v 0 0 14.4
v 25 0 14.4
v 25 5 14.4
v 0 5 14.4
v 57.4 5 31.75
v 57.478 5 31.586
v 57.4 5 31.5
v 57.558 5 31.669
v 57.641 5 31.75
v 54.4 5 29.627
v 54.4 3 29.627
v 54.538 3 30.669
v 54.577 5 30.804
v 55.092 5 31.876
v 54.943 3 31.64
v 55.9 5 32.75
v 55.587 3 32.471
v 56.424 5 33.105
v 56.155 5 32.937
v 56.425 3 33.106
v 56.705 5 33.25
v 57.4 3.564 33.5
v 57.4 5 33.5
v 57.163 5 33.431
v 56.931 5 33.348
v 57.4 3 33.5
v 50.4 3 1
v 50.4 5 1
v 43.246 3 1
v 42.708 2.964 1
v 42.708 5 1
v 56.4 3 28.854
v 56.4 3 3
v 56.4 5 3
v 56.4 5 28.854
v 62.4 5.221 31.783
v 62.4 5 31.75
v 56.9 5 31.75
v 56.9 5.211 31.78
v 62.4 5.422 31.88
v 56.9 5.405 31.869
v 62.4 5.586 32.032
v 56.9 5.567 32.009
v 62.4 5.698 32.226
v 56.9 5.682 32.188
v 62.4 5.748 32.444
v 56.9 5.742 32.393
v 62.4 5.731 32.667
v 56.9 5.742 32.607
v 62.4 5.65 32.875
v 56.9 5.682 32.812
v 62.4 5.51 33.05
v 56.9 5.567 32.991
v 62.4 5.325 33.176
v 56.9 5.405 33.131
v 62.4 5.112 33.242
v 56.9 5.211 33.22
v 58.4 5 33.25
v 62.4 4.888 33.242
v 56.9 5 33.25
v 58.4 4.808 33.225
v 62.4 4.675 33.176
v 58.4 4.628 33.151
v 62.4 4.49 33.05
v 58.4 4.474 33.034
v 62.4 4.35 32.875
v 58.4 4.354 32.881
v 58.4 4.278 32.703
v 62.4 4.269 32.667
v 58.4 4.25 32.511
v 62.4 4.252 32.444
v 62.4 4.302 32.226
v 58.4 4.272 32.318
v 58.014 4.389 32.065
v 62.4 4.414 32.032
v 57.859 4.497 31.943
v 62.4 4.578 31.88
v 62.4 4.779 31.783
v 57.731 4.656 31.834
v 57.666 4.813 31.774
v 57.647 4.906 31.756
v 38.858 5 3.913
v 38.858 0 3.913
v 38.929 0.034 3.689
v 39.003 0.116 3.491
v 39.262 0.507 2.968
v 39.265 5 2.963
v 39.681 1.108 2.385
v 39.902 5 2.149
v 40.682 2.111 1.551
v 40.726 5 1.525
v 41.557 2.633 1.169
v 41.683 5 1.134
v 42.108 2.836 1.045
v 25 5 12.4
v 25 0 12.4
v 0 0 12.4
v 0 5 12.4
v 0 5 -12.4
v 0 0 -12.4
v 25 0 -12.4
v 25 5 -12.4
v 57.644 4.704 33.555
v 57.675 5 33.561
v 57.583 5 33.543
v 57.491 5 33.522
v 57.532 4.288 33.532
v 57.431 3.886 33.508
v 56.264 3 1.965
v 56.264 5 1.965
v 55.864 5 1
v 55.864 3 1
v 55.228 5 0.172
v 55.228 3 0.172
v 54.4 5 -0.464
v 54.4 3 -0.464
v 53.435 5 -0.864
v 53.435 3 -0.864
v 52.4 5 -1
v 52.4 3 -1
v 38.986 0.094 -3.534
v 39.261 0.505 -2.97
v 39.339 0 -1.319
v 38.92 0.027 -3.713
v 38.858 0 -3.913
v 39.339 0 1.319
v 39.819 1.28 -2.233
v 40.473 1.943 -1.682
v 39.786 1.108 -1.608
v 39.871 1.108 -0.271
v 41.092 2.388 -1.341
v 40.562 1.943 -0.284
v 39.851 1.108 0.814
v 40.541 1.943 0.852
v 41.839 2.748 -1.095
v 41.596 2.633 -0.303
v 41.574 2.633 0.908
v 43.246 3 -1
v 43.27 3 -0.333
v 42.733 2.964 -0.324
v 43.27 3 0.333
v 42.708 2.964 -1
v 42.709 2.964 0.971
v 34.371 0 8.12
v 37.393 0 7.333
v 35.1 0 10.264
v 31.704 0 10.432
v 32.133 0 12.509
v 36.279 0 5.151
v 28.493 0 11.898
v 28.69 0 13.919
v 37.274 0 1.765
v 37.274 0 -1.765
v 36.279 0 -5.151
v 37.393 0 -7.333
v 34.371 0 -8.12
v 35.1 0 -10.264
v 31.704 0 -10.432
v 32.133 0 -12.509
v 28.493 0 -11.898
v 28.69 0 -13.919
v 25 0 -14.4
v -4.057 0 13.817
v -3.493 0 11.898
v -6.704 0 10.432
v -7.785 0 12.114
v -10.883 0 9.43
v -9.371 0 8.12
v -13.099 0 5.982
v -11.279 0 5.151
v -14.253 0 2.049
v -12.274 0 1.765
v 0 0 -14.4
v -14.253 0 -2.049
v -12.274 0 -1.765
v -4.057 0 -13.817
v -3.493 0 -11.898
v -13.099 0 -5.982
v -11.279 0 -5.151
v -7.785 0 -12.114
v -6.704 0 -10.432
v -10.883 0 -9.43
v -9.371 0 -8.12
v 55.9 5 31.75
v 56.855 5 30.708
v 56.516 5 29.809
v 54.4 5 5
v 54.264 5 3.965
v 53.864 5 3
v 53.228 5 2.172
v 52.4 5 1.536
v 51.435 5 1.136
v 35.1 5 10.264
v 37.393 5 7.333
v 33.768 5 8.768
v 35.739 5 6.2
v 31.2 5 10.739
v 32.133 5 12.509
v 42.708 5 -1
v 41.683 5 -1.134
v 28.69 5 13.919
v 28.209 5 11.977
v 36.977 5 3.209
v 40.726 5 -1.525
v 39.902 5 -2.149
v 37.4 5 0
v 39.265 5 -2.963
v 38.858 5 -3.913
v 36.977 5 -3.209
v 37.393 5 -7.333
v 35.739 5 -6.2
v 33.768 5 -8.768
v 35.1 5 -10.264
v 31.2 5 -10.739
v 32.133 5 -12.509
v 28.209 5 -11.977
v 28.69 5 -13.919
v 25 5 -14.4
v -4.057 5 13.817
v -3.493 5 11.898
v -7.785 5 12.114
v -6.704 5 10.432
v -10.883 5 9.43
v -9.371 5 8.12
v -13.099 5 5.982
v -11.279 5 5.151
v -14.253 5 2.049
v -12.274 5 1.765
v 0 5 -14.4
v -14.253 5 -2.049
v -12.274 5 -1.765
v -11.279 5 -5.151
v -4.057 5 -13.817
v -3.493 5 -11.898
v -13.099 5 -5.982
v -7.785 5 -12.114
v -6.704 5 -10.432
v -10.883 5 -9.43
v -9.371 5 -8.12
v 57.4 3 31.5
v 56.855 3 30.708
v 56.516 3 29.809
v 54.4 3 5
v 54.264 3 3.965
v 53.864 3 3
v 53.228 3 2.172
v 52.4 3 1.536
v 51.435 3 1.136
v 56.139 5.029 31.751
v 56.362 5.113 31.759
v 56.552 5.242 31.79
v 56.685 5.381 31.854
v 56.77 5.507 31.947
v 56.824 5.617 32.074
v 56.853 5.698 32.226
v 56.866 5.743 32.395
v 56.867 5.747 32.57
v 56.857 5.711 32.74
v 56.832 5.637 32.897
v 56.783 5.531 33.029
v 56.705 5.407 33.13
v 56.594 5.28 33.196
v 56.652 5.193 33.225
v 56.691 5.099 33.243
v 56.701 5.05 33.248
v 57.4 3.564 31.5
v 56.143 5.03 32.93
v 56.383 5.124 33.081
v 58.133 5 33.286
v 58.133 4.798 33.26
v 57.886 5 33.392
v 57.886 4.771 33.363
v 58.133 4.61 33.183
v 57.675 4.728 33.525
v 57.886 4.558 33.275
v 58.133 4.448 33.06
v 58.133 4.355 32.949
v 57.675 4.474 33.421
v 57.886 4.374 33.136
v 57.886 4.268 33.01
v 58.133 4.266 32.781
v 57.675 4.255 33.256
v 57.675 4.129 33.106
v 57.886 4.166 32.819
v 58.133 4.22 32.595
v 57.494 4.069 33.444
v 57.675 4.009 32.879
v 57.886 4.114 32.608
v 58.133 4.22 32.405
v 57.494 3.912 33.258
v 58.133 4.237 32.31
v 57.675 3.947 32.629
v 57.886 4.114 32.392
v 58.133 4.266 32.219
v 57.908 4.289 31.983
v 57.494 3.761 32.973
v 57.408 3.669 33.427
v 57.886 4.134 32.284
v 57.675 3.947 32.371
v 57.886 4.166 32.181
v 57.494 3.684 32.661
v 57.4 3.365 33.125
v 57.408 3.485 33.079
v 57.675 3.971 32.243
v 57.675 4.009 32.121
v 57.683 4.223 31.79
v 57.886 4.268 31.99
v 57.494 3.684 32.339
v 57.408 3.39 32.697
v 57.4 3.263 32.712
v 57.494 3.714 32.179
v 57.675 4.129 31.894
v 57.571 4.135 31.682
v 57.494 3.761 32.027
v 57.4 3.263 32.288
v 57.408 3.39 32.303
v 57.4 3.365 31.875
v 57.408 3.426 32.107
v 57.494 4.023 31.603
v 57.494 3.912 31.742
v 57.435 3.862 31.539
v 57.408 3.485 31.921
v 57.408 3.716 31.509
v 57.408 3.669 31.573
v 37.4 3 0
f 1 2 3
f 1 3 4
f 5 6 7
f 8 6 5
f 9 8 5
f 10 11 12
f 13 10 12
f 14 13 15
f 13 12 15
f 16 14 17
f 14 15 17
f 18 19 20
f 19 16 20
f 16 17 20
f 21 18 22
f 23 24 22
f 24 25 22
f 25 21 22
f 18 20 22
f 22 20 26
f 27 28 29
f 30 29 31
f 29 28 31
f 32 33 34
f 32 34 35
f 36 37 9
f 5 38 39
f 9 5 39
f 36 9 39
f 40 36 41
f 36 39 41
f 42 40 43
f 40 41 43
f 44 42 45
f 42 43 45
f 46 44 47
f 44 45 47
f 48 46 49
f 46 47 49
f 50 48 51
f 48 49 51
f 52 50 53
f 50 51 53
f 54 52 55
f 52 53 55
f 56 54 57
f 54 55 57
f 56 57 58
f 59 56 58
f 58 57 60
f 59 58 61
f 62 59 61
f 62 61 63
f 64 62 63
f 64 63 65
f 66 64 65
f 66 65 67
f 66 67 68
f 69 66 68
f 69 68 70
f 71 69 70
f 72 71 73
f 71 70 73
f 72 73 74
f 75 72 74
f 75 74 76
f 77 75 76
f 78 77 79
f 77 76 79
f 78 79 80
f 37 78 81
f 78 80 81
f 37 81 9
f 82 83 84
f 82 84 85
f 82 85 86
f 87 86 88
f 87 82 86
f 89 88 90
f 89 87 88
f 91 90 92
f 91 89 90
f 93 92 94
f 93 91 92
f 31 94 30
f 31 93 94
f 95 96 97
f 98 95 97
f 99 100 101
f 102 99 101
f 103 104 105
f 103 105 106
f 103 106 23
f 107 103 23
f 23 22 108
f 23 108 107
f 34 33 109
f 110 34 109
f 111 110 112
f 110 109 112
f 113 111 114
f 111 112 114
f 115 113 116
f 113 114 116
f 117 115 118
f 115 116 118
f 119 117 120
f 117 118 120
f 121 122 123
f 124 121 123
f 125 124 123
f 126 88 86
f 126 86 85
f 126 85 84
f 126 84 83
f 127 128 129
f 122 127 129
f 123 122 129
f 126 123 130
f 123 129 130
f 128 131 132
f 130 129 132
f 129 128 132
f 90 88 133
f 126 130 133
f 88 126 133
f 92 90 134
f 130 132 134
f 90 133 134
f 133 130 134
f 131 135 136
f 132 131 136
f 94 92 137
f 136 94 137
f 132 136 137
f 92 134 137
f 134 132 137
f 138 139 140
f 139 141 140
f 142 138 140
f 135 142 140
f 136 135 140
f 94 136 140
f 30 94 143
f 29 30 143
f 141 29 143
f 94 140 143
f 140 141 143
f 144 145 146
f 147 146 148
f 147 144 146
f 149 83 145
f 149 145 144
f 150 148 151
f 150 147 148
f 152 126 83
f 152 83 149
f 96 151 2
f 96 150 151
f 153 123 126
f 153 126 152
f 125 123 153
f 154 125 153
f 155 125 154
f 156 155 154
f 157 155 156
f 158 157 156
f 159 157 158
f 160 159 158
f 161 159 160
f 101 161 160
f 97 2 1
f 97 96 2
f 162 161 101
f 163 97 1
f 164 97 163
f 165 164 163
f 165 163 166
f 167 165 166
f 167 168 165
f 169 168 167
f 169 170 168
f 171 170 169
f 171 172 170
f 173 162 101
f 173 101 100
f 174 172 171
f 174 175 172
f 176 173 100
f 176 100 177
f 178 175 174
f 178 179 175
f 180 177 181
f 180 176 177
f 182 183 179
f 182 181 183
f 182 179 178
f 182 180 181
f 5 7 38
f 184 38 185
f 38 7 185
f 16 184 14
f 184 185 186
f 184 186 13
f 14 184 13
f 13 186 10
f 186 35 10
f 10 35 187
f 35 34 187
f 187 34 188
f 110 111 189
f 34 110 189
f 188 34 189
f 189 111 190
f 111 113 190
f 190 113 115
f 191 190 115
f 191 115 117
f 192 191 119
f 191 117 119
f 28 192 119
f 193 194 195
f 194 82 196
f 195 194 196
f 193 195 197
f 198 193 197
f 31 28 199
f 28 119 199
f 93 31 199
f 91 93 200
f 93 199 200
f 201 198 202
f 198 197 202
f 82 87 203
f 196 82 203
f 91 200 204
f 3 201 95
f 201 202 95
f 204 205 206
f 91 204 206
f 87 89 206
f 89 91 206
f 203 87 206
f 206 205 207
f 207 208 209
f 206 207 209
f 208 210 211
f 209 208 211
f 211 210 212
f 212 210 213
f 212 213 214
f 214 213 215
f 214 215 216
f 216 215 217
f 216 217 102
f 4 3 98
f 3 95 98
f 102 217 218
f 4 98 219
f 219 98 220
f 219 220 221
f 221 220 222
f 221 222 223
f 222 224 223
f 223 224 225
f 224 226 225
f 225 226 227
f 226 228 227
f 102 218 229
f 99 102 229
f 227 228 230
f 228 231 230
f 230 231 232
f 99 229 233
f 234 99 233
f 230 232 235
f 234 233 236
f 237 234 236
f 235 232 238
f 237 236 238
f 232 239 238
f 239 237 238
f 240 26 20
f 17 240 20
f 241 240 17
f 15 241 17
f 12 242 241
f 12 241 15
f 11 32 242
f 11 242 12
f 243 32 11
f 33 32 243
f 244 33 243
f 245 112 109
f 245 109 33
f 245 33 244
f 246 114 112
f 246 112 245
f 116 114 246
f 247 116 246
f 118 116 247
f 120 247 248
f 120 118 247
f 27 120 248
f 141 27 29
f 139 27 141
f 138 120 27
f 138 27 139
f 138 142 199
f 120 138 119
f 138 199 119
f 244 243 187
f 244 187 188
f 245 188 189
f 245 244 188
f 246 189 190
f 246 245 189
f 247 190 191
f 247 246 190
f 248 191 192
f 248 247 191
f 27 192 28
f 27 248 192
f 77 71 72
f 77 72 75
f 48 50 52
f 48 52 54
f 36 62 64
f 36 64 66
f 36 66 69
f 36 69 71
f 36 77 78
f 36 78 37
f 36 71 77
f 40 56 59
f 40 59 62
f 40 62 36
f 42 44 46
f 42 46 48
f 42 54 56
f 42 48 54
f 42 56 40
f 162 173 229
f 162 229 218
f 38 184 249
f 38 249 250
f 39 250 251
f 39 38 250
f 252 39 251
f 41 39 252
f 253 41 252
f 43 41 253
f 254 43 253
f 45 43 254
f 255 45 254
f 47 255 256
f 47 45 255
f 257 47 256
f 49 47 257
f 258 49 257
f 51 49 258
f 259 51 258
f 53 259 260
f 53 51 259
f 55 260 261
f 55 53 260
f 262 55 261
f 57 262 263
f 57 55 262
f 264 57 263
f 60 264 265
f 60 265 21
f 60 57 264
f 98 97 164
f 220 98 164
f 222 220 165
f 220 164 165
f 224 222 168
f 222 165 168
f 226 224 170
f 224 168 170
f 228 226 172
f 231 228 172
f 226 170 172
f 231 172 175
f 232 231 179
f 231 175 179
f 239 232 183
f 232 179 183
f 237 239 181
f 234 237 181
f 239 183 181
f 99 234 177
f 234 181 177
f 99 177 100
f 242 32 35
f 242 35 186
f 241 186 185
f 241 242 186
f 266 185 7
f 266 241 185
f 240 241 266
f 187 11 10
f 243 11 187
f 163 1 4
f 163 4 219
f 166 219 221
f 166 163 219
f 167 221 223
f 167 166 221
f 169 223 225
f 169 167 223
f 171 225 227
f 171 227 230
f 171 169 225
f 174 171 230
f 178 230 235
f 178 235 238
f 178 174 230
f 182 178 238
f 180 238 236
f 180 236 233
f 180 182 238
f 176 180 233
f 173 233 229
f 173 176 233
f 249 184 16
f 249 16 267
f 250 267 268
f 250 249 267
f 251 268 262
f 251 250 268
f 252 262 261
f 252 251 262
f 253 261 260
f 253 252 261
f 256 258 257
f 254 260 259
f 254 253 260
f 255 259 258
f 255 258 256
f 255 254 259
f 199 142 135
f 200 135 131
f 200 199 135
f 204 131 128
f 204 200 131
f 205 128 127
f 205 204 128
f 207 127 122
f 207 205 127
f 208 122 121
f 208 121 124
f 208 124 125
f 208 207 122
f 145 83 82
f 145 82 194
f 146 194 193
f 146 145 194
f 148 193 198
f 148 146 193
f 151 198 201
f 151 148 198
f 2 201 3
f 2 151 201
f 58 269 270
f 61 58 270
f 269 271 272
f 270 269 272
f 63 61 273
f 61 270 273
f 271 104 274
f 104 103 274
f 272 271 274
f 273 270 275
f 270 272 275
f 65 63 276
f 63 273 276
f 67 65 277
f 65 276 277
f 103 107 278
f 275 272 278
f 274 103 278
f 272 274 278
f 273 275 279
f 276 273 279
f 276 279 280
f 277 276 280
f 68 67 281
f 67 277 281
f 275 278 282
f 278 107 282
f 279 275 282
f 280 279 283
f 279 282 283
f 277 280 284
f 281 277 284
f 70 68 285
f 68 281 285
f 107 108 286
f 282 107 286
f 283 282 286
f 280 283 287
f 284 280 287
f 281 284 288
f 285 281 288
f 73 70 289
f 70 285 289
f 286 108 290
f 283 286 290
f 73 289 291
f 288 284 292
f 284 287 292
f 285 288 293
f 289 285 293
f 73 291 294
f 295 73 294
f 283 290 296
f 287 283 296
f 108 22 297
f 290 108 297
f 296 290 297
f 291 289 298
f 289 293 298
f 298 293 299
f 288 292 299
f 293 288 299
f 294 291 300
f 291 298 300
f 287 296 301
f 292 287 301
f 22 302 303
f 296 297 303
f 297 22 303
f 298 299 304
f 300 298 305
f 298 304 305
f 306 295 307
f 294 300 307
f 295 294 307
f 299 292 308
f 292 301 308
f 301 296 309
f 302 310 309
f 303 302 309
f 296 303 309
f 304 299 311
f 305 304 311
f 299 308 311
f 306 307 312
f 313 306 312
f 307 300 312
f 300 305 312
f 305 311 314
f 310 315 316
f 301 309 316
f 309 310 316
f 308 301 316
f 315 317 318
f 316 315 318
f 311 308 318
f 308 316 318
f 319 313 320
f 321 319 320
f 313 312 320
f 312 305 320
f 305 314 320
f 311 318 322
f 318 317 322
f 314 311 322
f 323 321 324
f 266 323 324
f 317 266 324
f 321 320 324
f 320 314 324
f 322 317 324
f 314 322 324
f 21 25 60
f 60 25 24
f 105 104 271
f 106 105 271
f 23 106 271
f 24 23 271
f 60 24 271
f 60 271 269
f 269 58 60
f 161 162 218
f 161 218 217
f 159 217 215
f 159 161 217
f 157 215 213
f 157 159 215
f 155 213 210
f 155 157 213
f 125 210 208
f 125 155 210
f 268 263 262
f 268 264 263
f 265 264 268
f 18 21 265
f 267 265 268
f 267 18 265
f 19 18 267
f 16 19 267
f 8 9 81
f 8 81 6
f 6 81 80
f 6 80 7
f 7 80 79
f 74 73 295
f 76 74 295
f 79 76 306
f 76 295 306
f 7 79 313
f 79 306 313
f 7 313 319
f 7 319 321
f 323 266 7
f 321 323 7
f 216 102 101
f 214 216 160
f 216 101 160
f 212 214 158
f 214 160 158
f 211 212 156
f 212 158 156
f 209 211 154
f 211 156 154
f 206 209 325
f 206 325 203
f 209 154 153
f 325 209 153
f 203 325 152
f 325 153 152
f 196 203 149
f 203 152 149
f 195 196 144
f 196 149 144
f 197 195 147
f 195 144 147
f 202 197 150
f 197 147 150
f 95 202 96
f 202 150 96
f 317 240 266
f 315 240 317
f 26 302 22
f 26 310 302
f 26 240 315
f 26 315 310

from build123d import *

# Parameters (mm, degrees)
BOSS_EXTRUDE1_DEPTH      = 5
BOSS_EXTRUDE2_START      = 2
SKETCH2_W                = 2
SKETCH2_H                = 2
SKETCH2_H_2              = 30.5
SKETCH2_W_2              = 1
BOSS_EXTRUDE2_DEPTH      = 2
FILLET1_R                = 4
BOSS_EXTRUDE3_DEPTH      = 5
BOSS_EXTRUDE3_DEPTH_BACK = 0.5
SKETCH3_R                = 0.75
FILLET2_R                = 1


with BuildPart() as part:
    # Sketch1 → Boss-Extrude1 (new body)
    with BuildSketch(Plane(origin=(0, 0, 0), x_dir=(1, 0, 0), z_dir=(0, 1, 0))):
        with BuildLine():
            Line((0, 14.4), (25, 14.4))
            ThreePointArc((25, 14.4), (39.4, 0), (25, -14.4))
            Line((25, -14.4), (0, -14.4))
            ThreePointArc((0, -14.4), (-14.4, 0), (0, 14.4))
        make_face()
        with BuildLine():
            Line((0, 12.4), (25, 12.4))
            ThreePointArc((25, 12.4), (37.4, 0), (25, -12.4))
            Line((25, -12.4), (0, -12.4))
            ThreePointArc((0, -12.4), (-12.4, 0), (0, 12.4))
        make_face(mode=Mode.SUBTRACT)
    extrude(amount=BOSS_EXTRUDE1_DEPTH)

    # Sketch2 → Boss-Extrude2 (add)
    with BuildSketch(Plane.XZ.offset(-5).offset(BOSS_EXTRUDE2_START)):
        with BuildLine():
            Line((39.365235814, -1), (54.4, -1))
            Line((54.4, -1), (54.4, 1))
            Line((54.4, 1), (39.365235814, 1))
            ThreePointArc((39.365235814, 1), (39.4, 0), (39.365235814, -1))
        make_face()
        with BuildLine():
            Line((37.4, -1), (39.365235814, -1))
            ThreePointArc((39.365235814, -1), (39.4, 0), (39.365235814, 1))
            Line((39.365235814, 1), (37.4, 1))
            Line((37.4, 1), (37.4, -1))
        make_face()
        with Locations((55.4, 0)):
            Rectangle(SKETCH2_W, SKETCH2_H)
        with Locations((55.4, 16.25)):
            Rectangle(SKETCH2_W, SKETCH2_H_2)
        with Locations((55.4, 32.5)):
            Rectangle(SKETCH2_W, SKETCH2_H)
        with Locations((56.9, 32.5)):
            Rectangle(SKETCH2_W_2, SKETCH2_H)
    extrude(amount=-BOSS_EXTRUDE2_DEPTH)

    # Fillet1
    # the kernel refuses this fillet: 4 mm, written as the material it adds along each edge
    with BuildSketch(Plane(origin=(25, 3, 0), x_dir=(0.7371891614816782, 0, -0.6756864214959037), z_dir=(-0.6756864214959037, 0, -0.7371891614816782))) as fillet1_piece_1_section:
        with BuildLine():
            CenterArc((18.272983346, 4), FILLET1_R, 194.477512186, 75.522487814)
            Line((18.272983346, 0), (18.272983346, -0.08))
            Line((18.272983346, -0.08), (14.4, -0.08))
            Line((14.4, -0.08), (14.32, 0))
            ThreePointArc((14.32, 0), (14.32, 1.5), (14.322540333, 2.98))
            Line((14.322540333, 2.98), (14.4, 3))
        make_face()
    fillet1_piece_1 = revolve(axis=Axis((25, 3, 0), (0, -1, 0)), revolution_arc=85.014954966, mode=Mode.PRIVATE)
    fillet1_piece_1 = split(fillet1_piece_1, bisect_by=Plane(origin=(40.301586348, 2.241602013, 1), z_dir=(0, 0, -1)), keep=Keep.TOP, mode=Mode.PRIVATE)
    fillet1_piece_1 = split(fillet1_piece_1, bisect_by=Plane(origin=(40.301586348, 2.241602013, -1), z_dir=(0, 0, 1)), keep=Keep.TOP, mode=Mode.PRIVATE)
    add(fillet1_piece_1)
    with BuildSketch(Plane(origin=(39.365235814, 5, 1), x_dir=(-0.17149804582148107, 0, 0.9851844600273663), z_dir=(0, -1, 0))) as fillet1_piece_2:
        with BuildLine():
            CenterArc((3.367524545, -3.978862537), FILLET1_R, 95.892851455, 74.232218513)
            Line((-0.573213295, -3.292870354), (-0.652028052, -3.27915051))
            Line((-0.652028052, -3.27915051), (-0.078814757, 0.013719844))
            Line((-0.078814757, 0.013719844), (0.008213474, 0.079577251))
            ThreePointArc((0.008213474, 0.079577251), (1.47842541, 0.003905135), (2.948637345, 0.079577251))
            Line((2.948637345, 0.079577251), (2.95685082, 0))
        make_face()
    extrude(amount=2)
    with BuildSketch(Plane(origin=(39.365235814, 5, -1), x_dir=(-0.17149804582148342, 0, -0.9851844600273658), z_dir=(0, -1, 0))) as fillet1_piece_3:
        with BuildLine():
            CenterArc((3.367524545, 3.978862537), FILLET1_R, 189.874930032, 74.232218513)
            Line((-0.573213295, 3.292870354), (-0.652028052, 3.27915051))
            Line((-0.652028052, 3.27915051), (-0.078814757, -0.013719844))
            Line((-0.078814757, -0.013719844), (0.008213474, -0.079577251))
            ThreePointArc((0.008213474, -0.079577251), (1.47842541, -0.003905135), (2.948637345, -0.079577251))
            Line((2.948637345, -0.079577251), (2.95685082, 0))
        make_face()
    extrude(amount=2)
    with BuildSketch(Plane(origin=(54.4, 3, 1), x_dir=(-1, 0, 0), z_dir=(0, 1, 0))) as fillet1_piece_4:
        with BuildLine():
            CenterArc((FILLET1_R, FILLET1_R), FILLET1_R, 180, 90)
            Line((0, FILLET1_R), (-FILLET1_R * 0.02, FILLET1_R))
            Line((-FILLET1_R * 0.02, FILLET1_R), (-FILLET1_R * 0.02, -FILLET1_R * 0.02))
            Line((-FILLET1_R * 0.02, -FILLET1_R * 0.02), (FILLET1_R, -FILLET1_R * 0.02))
            Line((FILLET1_R, -FILLET1_R * 0.02), (FILLET1_R, 0))
        make_face()
    extrude(amount=2)
    with BuildSketch(Plane(origin=(56.4, 3, 31.5), x_dir=(1, 0, 0), z_dir=(0, 1, 0))) as fillet1_piece_5:
        with BuildLine():
            CenterArc((4, 2.645751311), FILLET1_R, 180, 41.409622109)
            Line((0, 2.645751311), (-0.08, 2.645751311))
            Line((-0.08, 2.645751311), (-0.08, 0))
            Line((-0.08, 0), (0, -0.08))
            ThreePointArc((0, -0.08), (0.5, -0.08), (0.94, -0.052915026))
            Line((0.94, -0.052915026), (1, 0))
        make_face()
    extrude(amount=2)
    with BuildSketch(Plane(origin=(25, 3, 0), x_dir=(0.7371891614816782, 0, -0.6756864214959037), z_dir=(-0.6756864214959037, 0, -0.7371891614816782))) as fillet1_piece_6a_section:
        with BuildLine():
            CenterArc((18.272983346, 4), FILLET1_R, 194.477512186, 75.522487814)
            Line((18.272983346, 0), (18.272983346, -0.08))
            Line((18.272983346, -0.08), (14.4, -0.08))
            Line((14.4, -0.08), (14.32, 0))
            ThreePointArc((14.32, 0), (14.32, 1.5), (14.322540333, 2.98))
            Line((14.322540333, 2.98), (14.4, 3))
        make_face()
    fillet1_piece_6a = revolve(axis=Axis((25, 3, 0), (0, -1, 0)), revolution_arc=85.014954966, mode=Mode.PRIVATE)
    fillet1_piece_6a = split(fillet1_piece_6a, bisect_by=Plane(origin=(38.861424428, 2.266551756, -1), z_dir=(0, 0, -1)), keep=Keep.TOP, mode=Mode.PRIVATE)
    with BuildSketch(Plane(origin=(39.365235814, 5, -1), x_dir=(-0.17149804582148342, 0, -0.9851844600273658), z_dir=(0, -1, 0))) as fillet1_piece_6b_section:
        with BuildLine():
            CenterArc((3.367524545, 3.978862537), FILLET1_R, 189.874930032, 74.232218513)
            Line((-0.573213295, 3.292870354), (-0.652028052, 3.27915051))
            Line((-0.652028052, 3.27915051), (-0.078814757, -0.013719844))
            Line((-0.078814757, -0.013719844), (0.008213474, -0.079577251))
            ThreePointArc((0.008213474, -0.079577251), (1.47842541, -0.003905135), (2.948637345, -0.079577251))
            Line((2.948637345, -0.079577251), (2.95685082, 0))
        make_face()
    fillet1_piece_6b = extrude(amount=10.355974154, mode=Mode.PRIVATE)
    fillet1_piece_6b = split(fillet1_piece_6b, bisect_by=Plane(origin=(40.057221624, 0, -1.646357347), z_dir=(0, 1, 0)), keep=Keep.TOP, mode=Mode.PRIVATE)
    fillet1_piece_6b = split(fillet1_piece_6b, bisect_by=Plane(origin=(40.057221624, 3, -1.646357347), z_dir=(0, -1, 0)), keep=Keep.TOP, mode=Mode.PRIVATE)
    fillet1_piece_6 = fillet1_piece_6a & fillet1_piece_6b
    add(fillet1_piece_6)
    with BuildSketch(Plane(origin=(39.365235814, 5, 1), x_dir=(-0.17149804582148107, 0, 0.9851844600273663), z_dir=(0, -1, 0))) as fillet1_piece_7a_section:
        with BuildLine():
            CenterArc((3.367524545, -3.978862537), FILLET1_R, 95.892851455, 74.232218513)
            Line((-0.573213295, -3.292870354), (-0.652028052, -3.27915051))
            Line((-0.652028052, -3.27915051), (-0.078814757, 0.013719844))
            Line((-0.078814757, 0.013719844), (0.008213474, 0.079577251))
            ThreePointArc((0.008213474, 0.079577251), (1.47842541, 0.003905135), (2.948637345, 0.079577251))
            Line((2.948637345, 0.079577251), (2.95685082, 0))
        make_face()
    fillet1_piece_7a = extrude(amount=10.355974154, mode=Mode.PRIVATE)
    fillet1_piece_7a = split(fillet1_piece_7a, bisect_by=Plane(origin=(40.057221624, 0, 1.646357347), z_dir=(0, 1, 0)), keep=Keep.TOP, mode=Mode.PRIVATE)
    fillet1_piece_7a = split(fillet1_piece_7a, bisect_by=Plane(origin=(40.057221624, 3, 1.646357347), z_dir=(0, -1, 0)), keep=Keep.TOP, mode=Mode.PRIVATE)
    with BuildSketch(Plane(origin=(25, 3, 0), x_dir=(0.7371891614816782, 0, -0.6756864214959037), z_dir=(-0.6756864214959037, 0, -0.7371891614816782))) as fillet1_piece_7b_section:
        with BuildLine():
            CenterArc((18.272983346, 4), FILLET1_R, 194.477512186, 75.522487814)
            Line((18.272983346, 0), (18.272983346, -0.08))
            Line((18.272983346, -0.08), (14.4, -0.08))
            Line((14.4, -0.08), (14.32, 0))
            ThreePointArc((14.32, 0), (14.32, 1.5), (14.322540333, 2.98))
            Line((14.322540333, 2.98), (14.4, 3))
        make_face()
    fillet1_piece_7b = revolve(axis=Axis((25, 3, 0), (0, -1, 0)), revolution_arc=85.014954966, mode=Mode.PRIVATE)
    fillet1_piece_7b = split(fillet1_piece_7b, bisect_by=Plane(origin=(38.861423807, 2.266551545, 1), z_dir=(0, 0, 1)), keep=Keep.TOP, mode=Mode.PRIVATE)
    fillet1_piece_7 = fillet1_piece_7a & fillet1_piece_7b
    add(fillet1_piece_7)
    # the kernel refuses this fillet: 4 mm, written as the material it takes off along each edge
    with BuildSketch(Plane(origin=(56.4, -7, -1), x_dir=(0, 0, 1), z_dir=(0, 1, 0))) as fillet1_2_piece_1:
        with BuildLine():
            CenterArc((FILLET1_R, -FILLET1_R), FILLET1_R, 90, 90)
            Line((0, -FILLET1_R), (-FILLET1_R * 0.02, -FILLET1_R))
            Line((-FILLET1_R * 0.02, -FILLET1_R), (-FILLET1_R * 0.02, FILLET1_R * 0.02))
            Line((-FILLET1_R * 0.02, FILLET1_R * 0.02), (FILLET1_R, FILLET1_R * 0.02))
            Line((FILLET1_R, FILLET1_R * 0.02), (FILLET1_R, 0))
        make_face()
    extrude(amount=22, mode=Mode.SUBTRACT)
    with BuildSketch(Plane(origin=(54.4, -6.682458366, 33.5), x_dir=(0, 0, -1), z_dir=(0, 1, 0))) as fillet1_2_piece_2:
        with BuildLine():
            CenterArc((3.872983346, -4), FILLET1_R, 90, 75.522487814)
            Line((0, -3), (-0.077459667, -2.98))
            ThreePointArc((-0.077459667, -2.98), (-0.08, -1.5), (-0.08, 0))
            Line((-0.08, 0), (0, 0.08))
            Line((0, 0.08), (3.872983346, 0.08))
            Line((3.872983346, 0.08), (3.872983346, 0))
        make_face()
    extrude(amount=21.364916731, mode=Mode.SUBTRACT)

    # Sketch3 → Boss-Extrude3 (add, two sides: drawn at the far end of the back side and taken through both)
    with BuildSketch(Plane(origin=(57.4, 0, 0), x_dir=(0, 0, -1), z_dir=(1, 0, 0)).offset(-BOSS_EXTRUDE3_DEPTH_BACK)):
        with Locations((-32.5, 5)):
            Circle(SKETCH3_R)
    extrude(amount=BOSS_EXTRUDE3_DEPTH + BOSS_EXTRUDE3_DEPTH_BACK)

    # Fillet2
    # the kernel refuses this fillet: 1 mm, written as the material it adds along each edge
    with BuildSketch(Plane(origin=(56.9, 5, 29.25), x_dir=(-1, 0, 0), z_dir=(0, 0, 1))) as fillet2_piece_1_section:
        with BuildLine():
            CenterArc((FILLET2_R, -FILLET2_R), FILLET2_R, 90, 90)
            Line((0, -FILLET2_R), (0, 0))
            Line((0, 0), (FILLET2_R, 0))
        make_face()
    fillet2_piece_1 = extrude(amount=6.5, mode=Mode.PRIVATE)
    fillet2_piece_1 = fillet2_piece_1 & Plane(origin=(58.4, 5.187261993, 29.627016654), x_dir=(0, 0, -1), z_dir=(0, -1, 0)) * Cylinder(4, 17, mode=Mode.PRIVATE)
    fillet2_piece_1 = fillet2_piece_1 & Plane(origin=(56.665651888, 5, 32.5), x_dir=(0, 0, -1), z_dir=(1, 0, 0)) * Cylinder(0.75, 17, mode=Mode.PRIVATE)
    add(fillet2_piece_1)
    with BuildSketch(Plane(origin=(57.4, 5, 32.5), x_dir=(0, 0, 1), z_dir=(0, 1, 0))) as fillet2_piece_2_section:
        with BuildLine():
            CenterArc((0.75 + FILLET2_R, FILLET2_R), FILLET2_R, 180, 90)
            Line((0.75, FILLET2_R), (0.75, 0))
            Line((0.75, 0), (0.75 + FILLET2_R, 0))
        make_face()
    fillet2_piece_2 = revolve(axis=Axis((57.4, 5, 32.5), (1, 0, 0)), revolution_arc=180, mode=Mode.PRIVATE)
    fillet2_piece_2 = fillet2_piece_2 & Plane(origin=(58.4, 4.254671914, 29.627016654), x_dir=(0, 0, -1), z_dir=(0, -1, 0)) * Cylinder(4, 7, mode=Mode.PRIVATE)
    fillet2_piece_2 = fillet2_piece_2 - Plane(origin=(60.4, 4.254671914, 28.854248689), x_dir=(1, 0, 0), z_dir=(0, -1, 0)) * Cylinder(4, 7, mode=Mode.PRIVATE)
    add(fillet2_piece_2)


solid = part.part
